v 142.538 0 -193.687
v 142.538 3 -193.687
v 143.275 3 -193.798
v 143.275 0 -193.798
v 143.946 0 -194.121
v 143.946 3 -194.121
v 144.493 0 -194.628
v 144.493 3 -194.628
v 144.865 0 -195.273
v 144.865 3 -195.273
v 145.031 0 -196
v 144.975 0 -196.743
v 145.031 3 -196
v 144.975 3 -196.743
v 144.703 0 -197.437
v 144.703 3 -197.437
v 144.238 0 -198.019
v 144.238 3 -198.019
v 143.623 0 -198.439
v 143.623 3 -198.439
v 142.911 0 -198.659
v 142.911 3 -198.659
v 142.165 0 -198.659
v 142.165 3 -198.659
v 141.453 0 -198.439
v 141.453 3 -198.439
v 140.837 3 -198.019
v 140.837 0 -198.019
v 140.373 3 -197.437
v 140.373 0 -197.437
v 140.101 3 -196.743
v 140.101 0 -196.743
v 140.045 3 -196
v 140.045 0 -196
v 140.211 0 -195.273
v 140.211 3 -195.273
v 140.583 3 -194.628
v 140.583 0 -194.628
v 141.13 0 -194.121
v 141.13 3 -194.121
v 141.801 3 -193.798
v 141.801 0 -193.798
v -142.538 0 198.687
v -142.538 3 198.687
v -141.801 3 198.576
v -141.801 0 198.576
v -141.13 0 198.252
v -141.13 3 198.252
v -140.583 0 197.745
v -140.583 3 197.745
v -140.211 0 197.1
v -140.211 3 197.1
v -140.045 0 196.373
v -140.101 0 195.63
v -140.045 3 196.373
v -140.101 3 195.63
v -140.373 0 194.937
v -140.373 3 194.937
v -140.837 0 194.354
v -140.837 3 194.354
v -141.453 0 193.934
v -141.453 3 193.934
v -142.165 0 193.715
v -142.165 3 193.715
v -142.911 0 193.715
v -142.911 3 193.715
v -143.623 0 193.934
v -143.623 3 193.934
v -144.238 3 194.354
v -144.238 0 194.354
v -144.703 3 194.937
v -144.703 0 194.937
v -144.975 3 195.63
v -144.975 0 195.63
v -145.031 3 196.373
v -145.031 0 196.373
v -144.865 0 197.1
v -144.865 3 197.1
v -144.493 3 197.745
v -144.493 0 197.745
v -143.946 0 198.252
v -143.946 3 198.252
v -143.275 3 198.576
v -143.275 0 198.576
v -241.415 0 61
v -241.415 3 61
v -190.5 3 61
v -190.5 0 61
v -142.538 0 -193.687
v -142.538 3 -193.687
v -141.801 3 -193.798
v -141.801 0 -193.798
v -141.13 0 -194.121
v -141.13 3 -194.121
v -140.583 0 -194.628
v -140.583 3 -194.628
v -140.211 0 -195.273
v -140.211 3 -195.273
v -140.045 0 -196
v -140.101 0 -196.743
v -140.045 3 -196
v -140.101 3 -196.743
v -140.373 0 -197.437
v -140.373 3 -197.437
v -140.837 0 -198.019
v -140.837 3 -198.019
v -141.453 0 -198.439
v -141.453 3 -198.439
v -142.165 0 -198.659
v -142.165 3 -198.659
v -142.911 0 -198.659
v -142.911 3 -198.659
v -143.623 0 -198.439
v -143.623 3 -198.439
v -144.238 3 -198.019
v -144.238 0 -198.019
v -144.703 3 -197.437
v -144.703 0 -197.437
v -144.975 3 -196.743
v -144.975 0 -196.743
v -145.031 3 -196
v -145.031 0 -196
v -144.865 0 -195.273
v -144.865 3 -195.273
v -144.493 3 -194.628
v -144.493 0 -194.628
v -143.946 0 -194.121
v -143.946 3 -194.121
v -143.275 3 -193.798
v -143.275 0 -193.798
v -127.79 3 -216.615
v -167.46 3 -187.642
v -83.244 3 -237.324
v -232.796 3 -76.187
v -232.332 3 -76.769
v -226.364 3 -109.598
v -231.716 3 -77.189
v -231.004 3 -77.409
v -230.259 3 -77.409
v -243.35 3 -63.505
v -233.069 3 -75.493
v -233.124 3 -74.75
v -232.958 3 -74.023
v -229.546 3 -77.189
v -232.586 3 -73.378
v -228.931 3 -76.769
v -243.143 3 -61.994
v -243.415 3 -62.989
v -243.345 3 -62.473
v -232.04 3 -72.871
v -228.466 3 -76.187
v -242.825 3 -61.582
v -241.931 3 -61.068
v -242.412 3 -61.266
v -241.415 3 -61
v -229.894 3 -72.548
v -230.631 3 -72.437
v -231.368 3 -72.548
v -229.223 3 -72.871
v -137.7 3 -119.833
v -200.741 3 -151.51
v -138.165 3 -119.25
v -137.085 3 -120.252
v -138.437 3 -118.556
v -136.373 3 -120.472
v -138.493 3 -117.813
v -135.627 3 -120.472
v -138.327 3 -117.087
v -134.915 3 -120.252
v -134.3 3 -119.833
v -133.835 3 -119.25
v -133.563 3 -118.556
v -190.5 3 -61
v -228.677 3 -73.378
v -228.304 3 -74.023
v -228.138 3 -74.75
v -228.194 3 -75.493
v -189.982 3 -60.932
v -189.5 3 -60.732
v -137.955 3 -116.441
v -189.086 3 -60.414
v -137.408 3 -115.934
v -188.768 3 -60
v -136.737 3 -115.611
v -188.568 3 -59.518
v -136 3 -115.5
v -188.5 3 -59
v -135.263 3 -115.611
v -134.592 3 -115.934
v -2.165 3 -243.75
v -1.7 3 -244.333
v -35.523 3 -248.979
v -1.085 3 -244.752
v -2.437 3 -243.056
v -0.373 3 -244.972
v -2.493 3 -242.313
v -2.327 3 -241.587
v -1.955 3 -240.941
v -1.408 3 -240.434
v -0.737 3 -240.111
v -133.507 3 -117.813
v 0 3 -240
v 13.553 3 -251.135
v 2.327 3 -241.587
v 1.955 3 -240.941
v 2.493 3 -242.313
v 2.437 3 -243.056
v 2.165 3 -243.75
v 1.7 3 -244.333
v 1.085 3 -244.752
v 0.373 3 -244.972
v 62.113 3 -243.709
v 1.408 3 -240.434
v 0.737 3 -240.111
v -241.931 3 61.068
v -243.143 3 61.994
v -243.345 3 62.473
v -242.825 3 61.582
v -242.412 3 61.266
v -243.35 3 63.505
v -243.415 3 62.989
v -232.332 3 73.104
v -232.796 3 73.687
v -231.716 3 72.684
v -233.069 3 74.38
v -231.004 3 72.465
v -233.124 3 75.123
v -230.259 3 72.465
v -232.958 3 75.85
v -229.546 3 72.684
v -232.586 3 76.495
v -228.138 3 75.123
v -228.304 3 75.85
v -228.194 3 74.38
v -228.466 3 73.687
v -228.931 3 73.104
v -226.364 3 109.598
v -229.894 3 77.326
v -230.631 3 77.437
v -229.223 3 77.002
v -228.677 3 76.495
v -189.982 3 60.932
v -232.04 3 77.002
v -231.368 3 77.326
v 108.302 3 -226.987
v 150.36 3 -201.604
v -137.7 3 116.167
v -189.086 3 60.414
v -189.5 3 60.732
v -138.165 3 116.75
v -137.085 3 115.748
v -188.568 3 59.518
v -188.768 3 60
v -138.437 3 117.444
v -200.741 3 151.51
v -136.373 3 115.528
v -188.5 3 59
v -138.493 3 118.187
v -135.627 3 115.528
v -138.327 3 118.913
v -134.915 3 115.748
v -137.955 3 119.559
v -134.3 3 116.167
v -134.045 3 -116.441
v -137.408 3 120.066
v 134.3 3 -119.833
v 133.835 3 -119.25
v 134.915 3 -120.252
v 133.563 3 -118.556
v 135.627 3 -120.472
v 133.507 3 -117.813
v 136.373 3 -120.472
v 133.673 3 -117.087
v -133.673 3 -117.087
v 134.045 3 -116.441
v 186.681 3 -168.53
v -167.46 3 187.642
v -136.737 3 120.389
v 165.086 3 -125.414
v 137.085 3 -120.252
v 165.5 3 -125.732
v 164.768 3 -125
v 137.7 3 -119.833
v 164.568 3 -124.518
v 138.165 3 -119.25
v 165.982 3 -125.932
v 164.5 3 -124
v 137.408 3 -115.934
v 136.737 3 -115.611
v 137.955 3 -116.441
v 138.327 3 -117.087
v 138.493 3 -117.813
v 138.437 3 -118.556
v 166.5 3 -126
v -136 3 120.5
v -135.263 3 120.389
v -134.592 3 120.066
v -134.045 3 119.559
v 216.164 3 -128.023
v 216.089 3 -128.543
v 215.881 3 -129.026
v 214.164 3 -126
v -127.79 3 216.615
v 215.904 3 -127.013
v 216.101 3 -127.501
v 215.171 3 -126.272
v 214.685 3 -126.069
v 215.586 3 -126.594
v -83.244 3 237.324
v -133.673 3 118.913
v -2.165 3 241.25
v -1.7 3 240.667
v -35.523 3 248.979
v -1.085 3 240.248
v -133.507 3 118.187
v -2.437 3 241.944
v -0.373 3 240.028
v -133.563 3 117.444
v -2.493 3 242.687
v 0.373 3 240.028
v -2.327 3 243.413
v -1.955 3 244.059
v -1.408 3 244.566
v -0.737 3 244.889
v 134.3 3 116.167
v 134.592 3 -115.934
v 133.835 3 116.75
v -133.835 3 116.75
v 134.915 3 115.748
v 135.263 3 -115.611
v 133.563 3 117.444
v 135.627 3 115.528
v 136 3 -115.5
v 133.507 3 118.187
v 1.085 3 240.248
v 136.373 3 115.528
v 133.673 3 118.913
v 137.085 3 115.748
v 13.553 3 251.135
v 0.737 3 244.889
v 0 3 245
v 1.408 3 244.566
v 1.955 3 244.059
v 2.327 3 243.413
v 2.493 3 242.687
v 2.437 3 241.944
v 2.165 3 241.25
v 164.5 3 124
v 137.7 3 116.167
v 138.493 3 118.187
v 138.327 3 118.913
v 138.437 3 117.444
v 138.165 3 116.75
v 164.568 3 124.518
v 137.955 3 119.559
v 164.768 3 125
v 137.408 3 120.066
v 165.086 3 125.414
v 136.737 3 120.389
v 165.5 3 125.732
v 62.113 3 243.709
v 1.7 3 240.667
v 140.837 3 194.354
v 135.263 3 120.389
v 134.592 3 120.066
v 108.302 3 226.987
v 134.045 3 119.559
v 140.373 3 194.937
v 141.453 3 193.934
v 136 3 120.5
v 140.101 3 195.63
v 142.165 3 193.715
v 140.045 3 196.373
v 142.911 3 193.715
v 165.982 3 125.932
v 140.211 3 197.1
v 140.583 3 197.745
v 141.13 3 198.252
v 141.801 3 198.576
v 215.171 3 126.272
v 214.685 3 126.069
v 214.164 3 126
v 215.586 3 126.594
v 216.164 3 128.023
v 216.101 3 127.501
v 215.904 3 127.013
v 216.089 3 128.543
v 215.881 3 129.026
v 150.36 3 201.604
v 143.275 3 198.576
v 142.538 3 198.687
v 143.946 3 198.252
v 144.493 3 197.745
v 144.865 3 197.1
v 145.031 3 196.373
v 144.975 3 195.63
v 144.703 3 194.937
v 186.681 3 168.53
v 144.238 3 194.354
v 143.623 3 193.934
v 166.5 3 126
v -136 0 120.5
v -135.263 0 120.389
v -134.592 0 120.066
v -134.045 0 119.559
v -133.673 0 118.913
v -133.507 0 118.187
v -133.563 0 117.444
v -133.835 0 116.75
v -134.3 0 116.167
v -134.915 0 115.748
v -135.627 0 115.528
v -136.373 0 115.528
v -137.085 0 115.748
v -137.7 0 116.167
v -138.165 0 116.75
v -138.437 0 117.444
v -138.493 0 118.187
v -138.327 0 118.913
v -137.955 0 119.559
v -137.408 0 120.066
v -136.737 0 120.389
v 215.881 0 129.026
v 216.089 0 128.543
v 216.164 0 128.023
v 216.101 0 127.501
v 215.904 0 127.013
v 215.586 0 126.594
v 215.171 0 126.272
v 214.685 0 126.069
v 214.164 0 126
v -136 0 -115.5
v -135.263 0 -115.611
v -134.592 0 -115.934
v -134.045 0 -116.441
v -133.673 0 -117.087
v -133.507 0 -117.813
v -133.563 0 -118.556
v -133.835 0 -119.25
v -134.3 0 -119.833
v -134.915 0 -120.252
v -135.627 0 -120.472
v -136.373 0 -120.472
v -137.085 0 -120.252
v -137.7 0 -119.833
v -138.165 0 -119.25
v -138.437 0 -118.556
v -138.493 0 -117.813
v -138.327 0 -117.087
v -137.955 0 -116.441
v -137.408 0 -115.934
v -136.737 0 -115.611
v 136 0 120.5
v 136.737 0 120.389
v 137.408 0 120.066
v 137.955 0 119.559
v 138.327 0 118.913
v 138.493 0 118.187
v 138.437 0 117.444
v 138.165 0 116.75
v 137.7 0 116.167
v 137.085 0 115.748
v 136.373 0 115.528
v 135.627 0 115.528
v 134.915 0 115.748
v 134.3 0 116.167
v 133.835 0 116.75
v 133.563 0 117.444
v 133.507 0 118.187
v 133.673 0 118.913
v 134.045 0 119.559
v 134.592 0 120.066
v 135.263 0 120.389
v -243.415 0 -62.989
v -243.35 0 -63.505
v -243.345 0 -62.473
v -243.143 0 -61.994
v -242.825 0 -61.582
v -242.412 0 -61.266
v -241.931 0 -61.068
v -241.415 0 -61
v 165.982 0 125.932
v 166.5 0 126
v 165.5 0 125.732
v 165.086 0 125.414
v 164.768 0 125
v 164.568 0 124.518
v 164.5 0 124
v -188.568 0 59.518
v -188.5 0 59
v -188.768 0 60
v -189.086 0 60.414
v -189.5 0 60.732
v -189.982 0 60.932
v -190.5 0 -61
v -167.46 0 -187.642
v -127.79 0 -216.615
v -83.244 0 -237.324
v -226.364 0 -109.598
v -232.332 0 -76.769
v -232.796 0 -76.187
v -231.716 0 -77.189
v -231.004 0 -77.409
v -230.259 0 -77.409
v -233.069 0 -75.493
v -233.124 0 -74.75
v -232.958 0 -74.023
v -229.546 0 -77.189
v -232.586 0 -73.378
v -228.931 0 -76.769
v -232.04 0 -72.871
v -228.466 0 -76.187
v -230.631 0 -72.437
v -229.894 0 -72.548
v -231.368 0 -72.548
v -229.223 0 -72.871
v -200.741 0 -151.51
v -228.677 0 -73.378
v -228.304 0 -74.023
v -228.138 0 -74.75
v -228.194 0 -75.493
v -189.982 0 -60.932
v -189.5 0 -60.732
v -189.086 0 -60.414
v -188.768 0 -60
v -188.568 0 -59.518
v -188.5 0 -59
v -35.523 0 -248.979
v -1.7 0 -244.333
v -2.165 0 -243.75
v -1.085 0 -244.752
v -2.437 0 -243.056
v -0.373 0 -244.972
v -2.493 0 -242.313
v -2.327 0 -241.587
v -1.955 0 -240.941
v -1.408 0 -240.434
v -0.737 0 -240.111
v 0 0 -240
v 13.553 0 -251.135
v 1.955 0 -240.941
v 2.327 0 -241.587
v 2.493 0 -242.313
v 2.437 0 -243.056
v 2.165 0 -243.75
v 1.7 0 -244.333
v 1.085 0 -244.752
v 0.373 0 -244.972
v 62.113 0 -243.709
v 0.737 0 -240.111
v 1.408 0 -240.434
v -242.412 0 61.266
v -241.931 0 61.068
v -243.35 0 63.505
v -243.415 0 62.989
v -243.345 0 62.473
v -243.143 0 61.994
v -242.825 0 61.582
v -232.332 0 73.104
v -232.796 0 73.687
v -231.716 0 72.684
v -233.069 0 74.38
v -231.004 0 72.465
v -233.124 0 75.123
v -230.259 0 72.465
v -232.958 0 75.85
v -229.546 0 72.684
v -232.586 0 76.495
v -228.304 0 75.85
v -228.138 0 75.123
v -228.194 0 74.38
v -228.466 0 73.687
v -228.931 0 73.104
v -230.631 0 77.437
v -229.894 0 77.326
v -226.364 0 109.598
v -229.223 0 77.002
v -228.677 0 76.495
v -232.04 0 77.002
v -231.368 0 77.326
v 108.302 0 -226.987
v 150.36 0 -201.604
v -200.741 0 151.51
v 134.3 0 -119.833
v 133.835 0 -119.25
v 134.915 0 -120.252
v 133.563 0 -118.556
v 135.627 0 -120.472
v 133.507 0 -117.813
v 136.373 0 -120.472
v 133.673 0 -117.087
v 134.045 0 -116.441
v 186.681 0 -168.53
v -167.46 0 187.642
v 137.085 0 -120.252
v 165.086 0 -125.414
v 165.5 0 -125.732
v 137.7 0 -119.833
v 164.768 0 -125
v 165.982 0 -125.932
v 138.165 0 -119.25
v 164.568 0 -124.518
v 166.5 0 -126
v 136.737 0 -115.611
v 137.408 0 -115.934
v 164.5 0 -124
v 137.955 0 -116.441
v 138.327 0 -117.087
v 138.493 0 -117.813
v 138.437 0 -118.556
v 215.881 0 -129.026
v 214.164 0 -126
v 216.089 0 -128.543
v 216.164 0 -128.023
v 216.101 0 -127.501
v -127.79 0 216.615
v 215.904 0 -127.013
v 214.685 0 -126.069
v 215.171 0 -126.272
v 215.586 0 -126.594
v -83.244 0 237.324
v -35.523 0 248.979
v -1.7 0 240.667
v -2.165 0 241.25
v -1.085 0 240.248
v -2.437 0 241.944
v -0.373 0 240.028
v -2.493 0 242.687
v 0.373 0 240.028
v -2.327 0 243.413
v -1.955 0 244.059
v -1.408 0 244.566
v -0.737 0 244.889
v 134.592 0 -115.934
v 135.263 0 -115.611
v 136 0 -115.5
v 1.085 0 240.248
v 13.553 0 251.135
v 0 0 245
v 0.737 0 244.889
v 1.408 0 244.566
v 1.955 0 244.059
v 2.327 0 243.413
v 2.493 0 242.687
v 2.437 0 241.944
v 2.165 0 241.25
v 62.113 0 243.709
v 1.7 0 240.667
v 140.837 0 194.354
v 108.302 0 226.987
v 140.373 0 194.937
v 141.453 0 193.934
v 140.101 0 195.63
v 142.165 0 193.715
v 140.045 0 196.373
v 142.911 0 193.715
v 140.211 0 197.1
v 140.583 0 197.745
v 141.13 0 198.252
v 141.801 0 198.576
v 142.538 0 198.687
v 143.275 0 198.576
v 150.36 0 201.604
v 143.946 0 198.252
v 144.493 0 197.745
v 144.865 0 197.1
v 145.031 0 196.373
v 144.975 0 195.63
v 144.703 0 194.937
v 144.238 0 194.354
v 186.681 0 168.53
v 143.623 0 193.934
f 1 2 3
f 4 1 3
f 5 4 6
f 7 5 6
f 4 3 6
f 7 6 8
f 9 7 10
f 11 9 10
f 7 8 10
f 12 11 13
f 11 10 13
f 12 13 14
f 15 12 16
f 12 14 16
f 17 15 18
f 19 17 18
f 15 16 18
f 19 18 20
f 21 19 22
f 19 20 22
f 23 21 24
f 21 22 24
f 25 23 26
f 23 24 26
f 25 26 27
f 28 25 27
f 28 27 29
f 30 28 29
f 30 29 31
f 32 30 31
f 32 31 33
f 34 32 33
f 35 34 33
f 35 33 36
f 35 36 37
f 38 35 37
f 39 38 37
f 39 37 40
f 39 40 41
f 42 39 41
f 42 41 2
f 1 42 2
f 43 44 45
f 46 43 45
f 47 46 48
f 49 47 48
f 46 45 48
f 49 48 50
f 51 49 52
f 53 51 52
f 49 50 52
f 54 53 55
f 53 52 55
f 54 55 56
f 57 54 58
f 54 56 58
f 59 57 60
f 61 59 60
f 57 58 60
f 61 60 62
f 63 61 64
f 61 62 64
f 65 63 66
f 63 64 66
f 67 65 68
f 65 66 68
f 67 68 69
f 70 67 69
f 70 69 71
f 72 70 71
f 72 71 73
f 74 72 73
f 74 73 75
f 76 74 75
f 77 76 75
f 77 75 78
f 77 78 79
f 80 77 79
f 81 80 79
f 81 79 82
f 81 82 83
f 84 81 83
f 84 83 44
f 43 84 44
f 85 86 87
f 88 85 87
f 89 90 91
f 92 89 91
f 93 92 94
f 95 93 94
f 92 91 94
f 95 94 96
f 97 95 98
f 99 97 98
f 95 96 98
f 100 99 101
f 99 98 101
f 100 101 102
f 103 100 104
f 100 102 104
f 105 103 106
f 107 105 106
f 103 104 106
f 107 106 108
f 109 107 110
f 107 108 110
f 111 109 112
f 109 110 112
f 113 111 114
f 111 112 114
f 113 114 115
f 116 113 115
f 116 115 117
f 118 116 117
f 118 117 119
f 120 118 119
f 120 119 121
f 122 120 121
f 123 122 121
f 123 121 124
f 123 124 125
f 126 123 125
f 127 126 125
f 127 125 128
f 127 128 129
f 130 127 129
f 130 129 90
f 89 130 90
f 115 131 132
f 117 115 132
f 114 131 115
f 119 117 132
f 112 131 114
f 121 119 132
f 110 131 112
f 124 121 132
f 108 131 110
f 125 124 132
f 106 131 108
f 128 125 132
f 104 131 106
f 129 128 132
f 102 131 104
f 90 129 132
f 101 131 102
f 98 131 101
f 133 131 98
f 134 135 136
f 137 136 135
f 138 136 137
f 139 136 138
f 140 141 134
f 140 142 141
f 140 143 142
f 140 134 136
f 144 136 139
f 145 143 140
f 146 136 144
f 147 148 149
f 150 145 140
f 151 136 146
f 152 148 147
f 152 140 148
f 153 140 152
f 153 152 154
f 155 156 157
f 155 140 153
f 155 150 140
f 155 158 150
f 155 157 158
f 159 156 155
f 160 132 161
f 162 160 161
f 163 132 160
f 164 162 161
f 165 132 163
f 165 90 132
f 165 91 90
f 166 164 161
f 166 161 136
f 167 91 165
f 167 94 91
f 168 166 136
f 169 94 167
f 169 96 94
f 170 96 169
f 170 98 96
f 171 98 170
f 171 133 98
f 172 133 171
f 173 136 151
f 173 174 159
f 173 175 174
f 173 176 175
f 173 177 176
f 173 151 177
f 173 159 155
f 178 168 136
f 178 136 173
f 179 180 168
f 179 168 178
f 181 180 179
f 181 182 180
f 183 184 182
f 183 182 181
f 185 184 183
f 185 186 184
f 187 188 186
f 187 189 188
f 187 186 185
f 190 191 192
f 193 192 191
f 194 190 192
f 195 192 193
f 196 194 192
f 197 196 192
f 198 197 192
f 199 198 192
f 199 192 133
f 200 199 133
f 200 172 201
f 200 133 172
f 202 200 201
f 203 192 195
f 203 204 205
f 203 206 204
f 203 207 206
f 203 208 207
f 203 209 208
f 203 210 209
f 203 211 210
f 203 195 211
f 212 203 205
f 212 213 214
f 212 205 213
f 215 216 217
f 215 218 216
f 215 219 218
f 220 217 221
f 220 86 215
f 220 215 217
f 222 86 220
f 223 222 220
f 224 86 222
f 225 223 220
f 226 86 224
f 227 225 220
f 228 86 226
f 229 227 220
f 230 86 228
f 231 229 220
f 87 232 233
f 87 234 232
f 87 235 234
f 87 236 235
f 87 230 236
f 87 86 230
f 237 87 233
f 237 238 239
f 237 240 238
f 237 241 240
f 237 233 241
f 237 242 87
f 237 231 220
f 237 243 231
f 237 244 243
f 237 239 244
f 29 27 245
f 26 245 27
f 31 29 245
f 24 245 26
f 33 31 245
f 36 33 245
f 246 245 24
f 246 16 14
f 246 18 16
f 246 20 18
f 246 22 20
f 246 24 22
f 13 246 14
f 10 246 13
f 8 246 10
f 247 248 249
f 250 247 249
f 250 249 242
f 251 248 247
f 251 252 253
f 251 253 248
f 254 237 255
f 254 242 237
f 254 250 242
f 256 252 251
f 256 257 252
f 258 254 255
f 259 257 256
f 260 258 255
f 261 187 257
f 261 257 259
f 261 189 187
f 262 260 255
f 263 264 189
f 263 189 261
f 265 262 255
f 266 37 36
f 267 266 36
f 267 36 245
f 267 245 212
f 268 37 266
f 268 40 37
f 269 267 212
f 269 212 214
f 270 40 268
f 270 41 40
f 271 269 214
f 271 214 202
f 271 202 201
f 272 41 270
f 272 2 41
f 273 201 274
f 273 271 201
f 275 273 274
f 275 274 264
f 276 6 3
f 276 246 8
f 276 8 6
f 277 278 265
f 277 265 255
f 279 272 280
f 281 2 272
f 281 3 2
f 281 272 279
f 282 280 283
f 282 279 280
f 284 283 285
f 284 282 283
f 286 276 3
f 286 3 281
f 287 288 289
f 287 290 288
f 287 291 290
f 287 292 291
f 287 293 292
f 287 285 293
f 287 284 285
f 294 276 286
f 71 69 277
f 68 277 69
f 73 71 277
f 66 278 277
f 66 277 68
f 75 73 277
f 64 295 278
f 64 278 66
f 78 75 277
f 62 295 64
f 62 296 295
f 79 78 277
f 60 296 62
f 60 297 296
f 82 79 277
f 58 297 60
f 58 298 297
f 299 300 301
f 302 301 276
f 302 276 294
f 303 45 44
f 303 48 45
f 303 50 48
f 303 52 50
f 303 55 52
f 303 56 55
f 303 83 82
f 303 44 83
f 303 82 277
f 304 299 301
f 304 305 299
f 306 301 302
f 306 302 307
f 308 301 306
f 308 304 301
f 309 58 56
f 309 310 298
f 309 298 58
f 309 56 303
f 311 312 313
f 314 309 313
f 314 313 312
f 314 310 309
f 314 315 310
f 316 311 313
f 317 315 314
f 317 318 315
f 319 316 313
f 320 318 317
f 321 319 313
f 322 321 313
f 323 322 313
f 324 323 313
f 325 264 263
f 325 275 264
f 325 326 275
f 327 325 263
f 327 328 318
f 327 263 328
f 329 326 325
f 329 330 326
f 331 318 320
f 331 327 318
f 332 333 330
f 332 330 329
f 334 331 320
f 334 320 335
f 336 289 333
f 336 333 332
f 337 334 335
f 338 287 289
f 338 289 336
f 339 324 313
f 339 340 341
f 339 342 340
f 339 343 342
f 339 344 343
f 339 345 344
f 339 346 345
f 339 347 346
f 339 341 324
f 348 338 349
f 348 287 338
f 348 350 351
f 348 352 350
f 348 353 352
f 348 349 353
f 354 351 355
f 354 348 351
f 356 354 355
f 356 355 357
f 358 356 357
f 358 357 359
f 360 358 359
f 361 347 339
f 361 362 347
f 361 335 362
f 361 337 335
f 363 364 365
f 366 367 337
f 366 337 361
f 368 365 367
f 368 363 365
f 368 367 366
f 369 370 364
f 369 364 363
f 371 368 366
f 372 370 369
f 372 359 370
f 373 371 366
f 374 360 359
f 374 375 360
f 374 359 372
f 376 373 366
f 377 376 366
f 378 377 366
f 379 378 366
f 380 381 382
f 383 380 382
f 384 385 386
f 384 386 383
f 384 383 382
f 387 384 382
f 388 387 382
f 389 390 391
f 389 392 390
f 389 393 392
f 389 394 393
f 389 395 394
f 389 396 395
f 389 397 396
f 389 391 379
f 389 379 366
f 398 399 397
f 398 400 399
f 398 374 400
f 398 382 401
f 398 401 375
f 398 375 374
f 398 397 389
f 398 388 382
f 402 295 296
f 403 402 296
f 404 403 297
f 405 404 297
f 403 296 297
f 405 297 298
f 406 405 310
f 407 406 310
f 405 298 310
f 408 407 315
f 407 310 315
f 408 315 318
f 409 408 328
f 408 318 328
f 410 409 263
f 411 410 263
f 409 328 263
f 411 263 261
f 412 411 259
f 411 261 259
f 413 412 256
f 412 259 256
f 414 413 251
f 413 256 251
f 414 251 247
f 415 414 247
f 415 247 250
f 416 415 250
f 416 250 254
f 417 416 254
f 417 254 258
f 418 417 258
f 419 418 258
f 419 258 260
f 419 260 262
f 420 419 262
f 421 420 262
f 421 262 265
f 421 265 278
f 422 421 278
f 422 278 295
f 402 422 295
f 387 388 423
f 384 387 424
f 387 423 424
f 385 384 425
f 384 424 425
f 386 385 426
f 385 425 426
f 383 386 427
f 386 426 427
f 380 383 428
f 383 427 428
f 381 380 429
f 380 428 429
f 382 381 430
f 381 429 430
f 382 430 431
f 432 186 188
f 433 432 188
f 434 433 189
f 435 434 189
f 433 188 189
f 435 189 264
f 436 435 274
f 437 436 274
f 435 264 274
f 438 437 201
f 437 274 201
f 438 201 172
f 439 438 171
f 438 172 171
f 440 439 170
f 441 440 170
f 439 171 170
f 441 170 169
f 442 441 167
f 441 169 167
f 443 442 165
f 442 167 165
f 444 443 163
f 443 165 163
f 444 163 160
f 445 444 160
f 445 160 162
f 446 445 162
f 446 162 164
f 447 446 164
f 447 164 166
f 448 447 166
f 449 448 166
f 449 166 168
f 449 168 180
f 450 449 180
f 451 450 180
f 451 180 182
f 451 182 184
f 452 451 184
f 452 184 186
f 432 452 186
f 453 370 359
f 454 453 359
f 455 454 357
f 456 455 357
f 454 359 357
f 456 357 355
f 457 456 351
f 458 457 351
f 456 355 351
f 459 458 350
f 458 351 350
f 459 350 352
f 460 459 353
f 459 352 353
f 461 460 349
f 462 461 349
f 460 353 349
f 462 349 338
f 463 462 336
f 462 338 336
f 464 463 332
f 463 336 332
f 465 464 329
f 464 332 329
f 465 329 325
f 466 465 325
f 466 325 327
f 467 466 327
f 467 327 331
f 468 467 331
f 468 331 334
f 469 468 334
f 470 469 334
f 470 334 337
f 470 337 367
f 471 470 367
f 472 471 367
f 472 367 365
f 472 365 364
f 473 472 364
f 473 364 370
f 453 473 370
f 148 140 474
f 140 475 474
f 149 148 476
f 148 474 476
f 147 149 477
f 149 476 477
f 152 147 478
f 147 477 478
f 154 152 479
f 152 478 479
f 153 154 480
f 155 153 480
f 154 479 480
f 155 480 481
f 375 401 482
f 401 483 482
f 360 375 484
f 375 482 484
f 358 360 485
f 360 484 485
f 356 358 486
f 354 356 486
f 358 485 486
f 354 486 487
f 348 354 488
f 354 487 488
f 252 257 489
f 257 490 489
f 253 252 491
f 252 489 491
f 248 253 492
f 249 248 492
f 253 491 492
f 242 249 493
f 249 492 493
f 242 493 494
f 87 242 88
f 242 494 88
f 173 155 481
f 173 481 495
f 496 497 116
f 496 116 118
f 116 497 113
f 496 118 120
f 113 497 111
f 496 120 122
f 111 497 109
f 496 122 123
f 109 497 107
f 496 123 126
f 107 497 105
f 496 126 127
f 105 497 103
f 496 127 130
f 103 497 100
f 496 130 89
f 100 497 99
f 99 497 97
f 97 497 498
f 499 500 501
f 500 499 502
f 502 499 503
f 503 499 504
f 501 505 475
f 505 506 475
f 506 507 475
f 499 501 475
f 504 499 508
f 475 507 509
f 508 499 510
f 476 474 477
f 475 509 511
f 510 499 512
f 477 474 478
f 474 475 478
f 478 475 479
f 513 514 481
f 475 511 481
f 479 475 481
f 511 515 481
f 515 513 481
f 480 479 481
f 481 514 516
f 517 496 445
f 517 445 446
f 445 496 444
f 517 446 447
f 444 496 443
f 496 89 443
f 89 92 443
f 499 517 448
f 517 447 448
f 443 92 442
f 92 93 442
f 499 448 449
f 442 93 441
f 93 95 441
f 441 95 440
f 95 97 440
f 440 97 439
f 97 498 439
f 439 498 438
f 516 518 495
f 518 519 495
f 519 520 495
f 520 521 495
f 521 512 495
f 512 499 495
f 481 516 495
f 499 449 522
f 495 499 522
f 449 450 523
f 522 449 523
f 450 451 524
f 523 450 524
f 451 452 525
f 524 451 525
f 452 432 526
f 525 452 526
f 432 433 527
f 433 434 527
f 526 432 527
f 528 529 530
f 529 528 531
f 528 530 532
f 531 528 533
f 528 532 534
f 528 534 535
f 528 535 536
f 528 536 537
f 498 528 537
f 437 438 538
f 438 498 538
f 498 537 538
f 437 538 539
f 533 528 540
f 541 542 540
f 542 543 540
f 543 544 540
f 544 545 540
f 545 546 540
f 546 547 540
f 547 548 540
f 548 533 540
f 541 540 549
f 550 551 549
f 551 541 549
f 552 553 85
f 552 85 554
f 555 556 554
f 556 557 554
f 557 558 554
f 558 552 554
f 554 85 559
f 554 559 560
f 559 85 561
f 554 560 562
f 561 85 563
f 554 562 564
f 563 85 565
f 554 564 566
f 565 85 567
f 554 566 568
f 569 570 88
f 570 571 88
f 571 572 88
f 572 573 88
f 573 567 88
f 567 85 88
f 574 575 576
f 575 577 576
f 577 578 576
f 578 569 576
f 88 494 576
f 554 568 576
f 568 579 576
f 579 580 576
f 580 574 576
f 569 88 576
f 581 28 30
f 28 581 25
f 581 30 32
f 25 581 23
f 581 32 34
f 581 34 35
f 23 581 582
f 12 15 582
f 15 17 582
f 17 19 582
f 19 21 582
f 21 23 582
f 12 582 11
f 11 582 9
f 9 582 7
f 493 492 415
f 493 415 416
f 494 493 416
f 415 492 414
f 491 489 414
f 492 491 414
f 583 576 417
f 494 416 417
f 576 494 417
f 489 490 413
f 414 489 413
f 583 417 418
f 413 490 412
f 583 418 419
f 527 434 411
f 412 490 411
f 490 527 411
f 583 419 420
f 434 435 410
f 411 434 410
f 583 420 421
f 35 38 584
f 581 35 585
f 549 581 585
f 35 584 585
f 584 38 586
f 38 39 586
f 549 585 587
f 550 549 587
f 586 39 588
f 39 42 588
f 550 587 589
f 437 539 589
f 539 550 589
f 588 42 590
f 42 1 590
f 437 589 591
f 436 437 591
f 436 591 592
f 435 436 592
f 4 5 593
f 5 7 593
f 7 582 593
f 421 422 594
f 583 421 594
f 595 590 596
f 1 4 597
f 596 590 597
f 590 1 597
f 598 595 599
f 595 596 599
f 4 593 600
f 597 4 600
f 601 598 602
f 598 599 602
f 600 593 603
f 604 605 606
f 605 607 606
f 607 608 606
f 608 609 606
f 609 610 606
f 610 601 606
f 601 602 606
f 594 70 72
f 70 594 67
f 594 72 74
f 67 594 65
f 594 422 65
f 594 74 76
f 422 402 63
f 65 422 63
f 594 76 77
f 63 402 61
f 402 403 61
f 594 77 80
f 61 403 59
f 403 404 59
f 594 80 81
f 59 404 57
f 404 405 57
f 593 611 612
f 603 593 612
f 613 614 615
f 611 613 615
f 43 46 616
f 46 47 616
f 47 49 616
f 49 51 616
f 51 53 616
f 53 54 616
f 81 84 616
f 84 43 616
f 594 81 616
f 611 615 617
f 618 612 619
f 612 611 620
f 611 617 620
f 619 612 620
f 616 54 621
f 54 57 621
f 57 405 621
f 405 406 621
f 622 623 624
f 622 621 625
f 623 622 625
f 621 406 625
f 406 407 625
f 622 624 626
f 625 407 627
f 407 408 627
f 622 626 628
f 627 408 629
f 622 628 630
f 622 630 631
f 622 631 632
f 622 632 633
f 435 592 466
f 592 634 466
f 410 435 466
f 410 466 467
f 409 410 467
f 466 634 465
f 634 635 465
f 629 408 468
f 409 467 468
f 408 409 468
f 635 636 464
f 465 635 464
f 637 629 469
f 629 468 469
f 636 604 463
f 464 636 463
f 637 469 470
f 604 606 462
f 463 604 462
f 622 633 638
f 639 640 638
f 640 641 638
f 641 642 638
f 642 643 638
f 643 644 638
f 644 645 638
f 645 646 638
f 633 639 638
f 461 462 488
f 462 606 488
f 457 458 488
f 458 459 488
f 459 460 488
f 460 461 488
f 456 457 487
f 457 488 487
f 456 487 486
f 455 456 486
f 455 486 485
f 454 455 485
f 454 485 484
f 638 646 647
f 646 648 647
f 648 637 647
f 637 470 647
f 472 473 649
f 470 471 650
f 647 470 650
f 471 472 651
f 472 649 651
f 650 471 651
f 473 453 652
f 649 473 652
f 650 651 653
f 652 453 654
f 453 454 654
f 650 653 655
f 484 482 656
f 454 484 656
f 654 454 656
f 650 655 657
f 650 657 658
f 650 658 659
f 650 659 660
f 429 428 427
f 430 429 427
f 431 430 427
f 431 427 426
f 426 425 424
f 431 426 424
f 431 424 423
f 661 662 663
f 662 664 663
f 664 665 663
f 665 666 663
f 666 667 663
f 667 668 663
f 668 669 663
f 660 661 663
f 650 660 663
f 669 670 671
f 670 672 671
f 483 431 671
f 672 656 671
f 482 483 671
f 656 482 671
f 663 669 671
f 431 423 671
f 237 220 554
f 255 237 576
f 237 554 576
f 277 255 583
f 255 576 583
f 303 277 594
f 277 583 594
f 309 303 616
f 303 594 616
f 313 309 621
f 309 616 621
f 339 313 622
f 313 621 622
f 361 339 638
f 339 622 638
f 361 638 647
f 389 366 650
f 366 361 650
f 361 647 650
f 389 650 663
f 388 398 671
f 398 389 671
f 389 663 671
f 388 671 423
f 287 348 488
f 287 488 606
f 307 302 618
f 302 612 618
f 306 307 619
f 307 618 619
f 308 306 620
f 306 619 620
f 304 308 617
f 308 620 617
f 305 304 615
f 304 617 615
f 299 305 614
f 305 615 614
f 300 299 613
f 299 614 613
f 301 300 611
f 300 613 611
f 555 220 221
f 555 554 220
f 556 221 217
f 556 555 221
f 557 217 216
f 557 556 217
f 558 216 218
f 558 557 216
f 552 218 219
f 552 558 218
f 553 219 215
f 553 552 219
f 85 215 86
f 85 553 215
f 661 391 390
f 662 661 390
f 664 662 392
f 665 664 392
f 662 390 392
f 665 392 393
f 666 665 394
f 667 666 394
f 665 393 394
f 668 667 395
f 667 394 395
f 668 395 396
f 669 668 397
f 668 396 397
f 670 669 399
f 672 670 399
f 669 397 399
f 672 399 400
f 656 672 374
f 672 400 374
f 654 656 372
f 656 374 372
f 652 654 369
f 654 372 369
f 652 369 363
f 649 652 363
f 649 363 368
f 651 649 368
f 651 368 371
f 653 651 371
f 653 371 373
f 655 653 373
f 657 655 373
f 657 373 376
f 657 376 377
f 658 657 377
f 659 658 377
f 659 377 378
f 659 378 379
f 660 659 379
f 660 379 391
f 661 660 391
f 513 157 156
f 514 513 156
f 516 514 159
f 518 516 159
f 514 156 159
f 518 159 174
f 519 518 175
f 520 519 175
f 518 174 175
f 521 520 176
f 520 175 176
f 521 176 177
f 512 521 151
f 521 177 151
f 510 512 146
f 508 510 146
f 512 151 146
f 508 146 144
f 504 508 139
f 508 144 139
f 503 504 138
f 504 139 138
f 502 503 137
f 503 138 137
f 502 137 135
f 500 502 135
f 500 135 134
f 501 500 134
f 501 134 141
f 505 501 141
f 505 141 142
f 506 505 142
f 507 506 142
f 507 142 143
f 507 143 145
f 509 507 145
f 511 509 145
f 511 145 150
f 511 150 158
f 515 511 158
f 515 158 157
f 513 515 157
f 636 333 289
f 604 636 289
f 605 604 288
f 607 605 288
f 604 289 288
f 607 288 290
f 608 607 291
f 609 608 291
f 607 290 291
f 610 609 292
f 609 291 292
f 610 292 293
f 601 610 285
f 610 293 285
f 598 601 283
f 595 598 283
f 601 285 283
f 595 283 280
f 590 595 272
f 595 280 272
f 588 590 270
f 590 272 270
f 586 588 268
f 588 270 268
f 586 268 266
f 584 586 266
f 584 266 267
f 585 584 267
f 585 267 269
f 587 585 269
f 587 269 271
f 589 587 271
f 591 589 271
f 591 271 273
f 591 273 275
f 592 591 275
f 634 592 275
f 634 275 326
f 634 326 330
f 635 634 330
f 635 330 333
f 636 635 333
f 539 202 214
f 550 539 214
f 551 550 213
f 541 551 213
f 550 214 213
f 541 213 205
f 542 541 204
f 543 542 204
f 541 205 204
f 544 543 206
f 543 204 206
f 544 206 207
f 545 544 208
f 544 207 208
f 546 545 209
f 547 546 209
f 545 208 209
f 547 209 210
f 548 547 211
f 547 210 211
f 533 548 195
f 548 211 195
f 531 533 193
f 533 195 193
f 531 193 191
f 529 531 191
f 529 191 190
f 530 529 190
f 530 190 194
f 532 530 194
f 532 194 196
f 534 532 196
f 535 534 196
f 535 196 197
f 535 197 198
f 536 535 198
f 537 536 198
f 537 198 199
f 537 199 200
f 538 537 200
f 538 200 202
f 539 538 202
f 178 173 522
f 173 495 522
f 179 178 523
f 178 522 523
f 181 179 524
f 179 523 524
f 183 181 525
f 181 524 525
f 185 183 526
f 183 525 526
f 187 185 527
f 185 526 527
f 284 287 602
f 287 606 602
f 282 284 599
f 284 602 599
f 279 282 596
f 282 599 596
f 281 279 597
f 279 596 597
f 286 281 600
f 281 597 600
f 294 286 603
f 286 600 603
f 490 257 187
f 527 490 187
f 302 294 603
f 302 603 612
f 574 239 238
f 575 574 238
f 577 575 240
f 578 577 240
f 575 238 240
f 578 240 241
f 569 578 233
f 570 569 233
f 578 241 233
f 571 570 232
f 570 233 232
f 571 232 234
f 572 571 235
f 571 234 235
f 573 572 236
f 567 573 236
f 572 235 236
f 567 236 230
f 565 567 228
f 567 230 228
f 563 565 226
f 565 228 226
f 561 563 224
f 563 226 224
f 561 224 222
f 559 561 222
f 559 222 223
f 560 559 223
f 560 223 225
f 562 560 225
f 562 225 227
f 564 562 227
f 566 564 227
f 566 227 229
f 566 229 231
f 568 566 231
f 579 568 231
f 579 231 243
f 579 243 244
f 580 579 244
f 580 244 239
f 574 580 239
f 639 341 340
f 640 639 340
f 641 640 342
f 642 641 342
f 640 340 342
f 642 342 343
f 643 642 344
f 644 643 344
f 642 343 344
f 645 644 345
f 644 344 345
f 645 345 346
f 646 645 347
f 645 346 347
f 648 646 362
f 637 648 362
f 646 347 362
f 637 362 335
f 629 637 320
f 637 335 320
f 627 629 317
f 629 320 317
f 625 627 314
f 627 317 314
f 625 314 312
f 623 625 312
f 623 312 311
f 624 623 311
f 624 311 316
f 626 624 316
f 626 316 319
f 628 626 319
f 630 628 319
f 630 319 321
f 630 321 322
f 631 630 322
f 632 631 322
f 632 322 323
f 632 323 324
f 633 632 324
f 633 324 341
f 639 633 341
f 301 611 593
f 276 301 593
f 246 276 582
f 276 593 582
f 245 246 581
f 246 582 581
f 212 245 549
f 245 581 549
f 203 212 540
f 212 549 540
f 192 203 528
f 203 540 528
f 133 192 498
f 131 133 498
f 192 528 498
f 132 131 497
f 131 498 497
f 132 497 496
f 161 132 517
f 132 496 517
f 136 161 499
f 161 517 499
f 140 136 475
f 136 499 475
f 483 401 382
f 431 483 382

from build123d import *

# Parameters (mm, degrees)
SKETCH1_R           = 251.5
BOSS_EXTRUDE1_DEPTH = 3
SKETCH2_R           = 2.5
CUT_EXTRUDE1_DEPTH  = 5
SKETCH4_R           = 2.5
CUT_EXTRUDE3_DEPTH  = 5
SKETCH5_W           = 73.96870399
SKETCH5_H           = 122
SKETCH5_W_2         = 122.237238898
SKETCH5_H_2         = 252
CUT_EXTRUDE4_DEPTH  = 10
FILLET1_R           = 2


with BuildPart() as part:
    # Sketch1 → Boss-Extrude1 (new body)
    with BuildSketch(Plane(origin=(0, 0, 0), x_dir=(1, 0, 0), z_dir=(0, 1, 0))):
        with Locations(Location((0, 0, 0), (0, 0, 270))):
            Circle(SKETCH1_R)
    extrude(amount=BOSS_EXTRUDE1_DEPTH)

    # Sketch2 → Cut-Extrude1 (cut)
    with BuildSketch(Plane(origin=(0, 3, 0), x_dir=(1, 0, 0), z_dir=(0, 1, 0))):
        with Locations(Location((-136, 118, 0), (0, 0, 270))):
            Circle(SKETCH2_R)
        with Locations(Location((136, 118, 0), (0, 0, 270))):
            Circle(SKETCH2_R)
        with Locations(Location((136, -118, 0), (0, 0, 270))):
            Circle(SKETCH2_R)
        with Locations(Location((-136, -118, 0), (0, 0, 270))):
            Circle(SKETCH2_R)
    extrude(amount=-CUT_EXTRUDE1_DEPTH, mode=Mode.SUBTRACT)

    # Sketch4 → Cut-Extrude3 (cut)
    with BuildSketch(Plane(origin=(0, 3, 0), x_dir=(1, 0, 0), z_dir=(0, 1, 0))):
        with Locations(Location((0, 242.5, 0), (0, 0, 270))):
            Circle(SKETCH4_R)
        with Locations(Location((142.537923681, 196.186621136, 0), (0, 0, 270))):
            Circle(SKETCH4_R)
        with Locations(Location((230.631205202, 74.936621136, 0), (0, 0, 270))):
            Circle(SKETCH4_R)
        with Locations(Location((230.631205202, -74.936621136, 0), (0, 0, 270))):
            Circle(SKETCH4_R)
        with Locations(Location((142.537923681, -196.186621136, 0), (0, 0, 270))):
            Circle(SKETCH4_R)
        with Locations(Location((0, -242.5, 0), (0, 0, 270))):
            Circle(SKETCH4_R)
        with Locations(Location((-142.537923681, -196.186621136, 0), (0, 0, 270))):
            Circle(SKETCH4_R)
        with Locations(Location((-230.631205202, -74.936621136, 0), (0, 0, 270))):
            Circle(SKETCH4_R)
        with Locations(Location((-230.631205202, 74.936621136, 0), (0, 0, 270))):
            Circle(SKETCH4_R)
        with Locations(Location((-142.537923681, 196.186621136, 0), (0, 0, 270))):
            Circle(SKETCH4_R)
    extrude(amount=-CUT_EXTRUDE3_DEPTH, mode=Mode.SUBTRACT)

    # Sketch5 → Cut-Extrude4 (cut)
    with BuildSketch(Plane(origin=(0, 3, 0), x_dir=(1, 0, 0), z_dir=(0, 1, 0))):
        with Locations((-225.484351995, 0)):
            Rectangle(SKETCH5_W, SKETCH5_H)
        with Locations((225.618619449, 0)):
            Rectangle(SKETCH5_W_2, SKETCH5_H_2)
    extrude(amount=-CUT_EXTRUDE4_DEPTH, mode=Mode.SUBTRACT)

    # Fillet1
    fillet1_edges = [part.edges().sort_by_distance(p)[0] for p in [
        (-188.5, 1.5, -61),
        (-243.990266199, 1.5, 61),
        (-188.5, 1.5, 61),
        (-243.990266199, 1.5, -61),
        (164.5, 1.5, 126),
        (217.660860055, 1.5, -126),
        (164.5, 1.5, -126),
        (217.660860055, 1.5, 126),
    ]]
    fillet(fillet1_edges, radius=FILLET1_R)


solid = part.part
